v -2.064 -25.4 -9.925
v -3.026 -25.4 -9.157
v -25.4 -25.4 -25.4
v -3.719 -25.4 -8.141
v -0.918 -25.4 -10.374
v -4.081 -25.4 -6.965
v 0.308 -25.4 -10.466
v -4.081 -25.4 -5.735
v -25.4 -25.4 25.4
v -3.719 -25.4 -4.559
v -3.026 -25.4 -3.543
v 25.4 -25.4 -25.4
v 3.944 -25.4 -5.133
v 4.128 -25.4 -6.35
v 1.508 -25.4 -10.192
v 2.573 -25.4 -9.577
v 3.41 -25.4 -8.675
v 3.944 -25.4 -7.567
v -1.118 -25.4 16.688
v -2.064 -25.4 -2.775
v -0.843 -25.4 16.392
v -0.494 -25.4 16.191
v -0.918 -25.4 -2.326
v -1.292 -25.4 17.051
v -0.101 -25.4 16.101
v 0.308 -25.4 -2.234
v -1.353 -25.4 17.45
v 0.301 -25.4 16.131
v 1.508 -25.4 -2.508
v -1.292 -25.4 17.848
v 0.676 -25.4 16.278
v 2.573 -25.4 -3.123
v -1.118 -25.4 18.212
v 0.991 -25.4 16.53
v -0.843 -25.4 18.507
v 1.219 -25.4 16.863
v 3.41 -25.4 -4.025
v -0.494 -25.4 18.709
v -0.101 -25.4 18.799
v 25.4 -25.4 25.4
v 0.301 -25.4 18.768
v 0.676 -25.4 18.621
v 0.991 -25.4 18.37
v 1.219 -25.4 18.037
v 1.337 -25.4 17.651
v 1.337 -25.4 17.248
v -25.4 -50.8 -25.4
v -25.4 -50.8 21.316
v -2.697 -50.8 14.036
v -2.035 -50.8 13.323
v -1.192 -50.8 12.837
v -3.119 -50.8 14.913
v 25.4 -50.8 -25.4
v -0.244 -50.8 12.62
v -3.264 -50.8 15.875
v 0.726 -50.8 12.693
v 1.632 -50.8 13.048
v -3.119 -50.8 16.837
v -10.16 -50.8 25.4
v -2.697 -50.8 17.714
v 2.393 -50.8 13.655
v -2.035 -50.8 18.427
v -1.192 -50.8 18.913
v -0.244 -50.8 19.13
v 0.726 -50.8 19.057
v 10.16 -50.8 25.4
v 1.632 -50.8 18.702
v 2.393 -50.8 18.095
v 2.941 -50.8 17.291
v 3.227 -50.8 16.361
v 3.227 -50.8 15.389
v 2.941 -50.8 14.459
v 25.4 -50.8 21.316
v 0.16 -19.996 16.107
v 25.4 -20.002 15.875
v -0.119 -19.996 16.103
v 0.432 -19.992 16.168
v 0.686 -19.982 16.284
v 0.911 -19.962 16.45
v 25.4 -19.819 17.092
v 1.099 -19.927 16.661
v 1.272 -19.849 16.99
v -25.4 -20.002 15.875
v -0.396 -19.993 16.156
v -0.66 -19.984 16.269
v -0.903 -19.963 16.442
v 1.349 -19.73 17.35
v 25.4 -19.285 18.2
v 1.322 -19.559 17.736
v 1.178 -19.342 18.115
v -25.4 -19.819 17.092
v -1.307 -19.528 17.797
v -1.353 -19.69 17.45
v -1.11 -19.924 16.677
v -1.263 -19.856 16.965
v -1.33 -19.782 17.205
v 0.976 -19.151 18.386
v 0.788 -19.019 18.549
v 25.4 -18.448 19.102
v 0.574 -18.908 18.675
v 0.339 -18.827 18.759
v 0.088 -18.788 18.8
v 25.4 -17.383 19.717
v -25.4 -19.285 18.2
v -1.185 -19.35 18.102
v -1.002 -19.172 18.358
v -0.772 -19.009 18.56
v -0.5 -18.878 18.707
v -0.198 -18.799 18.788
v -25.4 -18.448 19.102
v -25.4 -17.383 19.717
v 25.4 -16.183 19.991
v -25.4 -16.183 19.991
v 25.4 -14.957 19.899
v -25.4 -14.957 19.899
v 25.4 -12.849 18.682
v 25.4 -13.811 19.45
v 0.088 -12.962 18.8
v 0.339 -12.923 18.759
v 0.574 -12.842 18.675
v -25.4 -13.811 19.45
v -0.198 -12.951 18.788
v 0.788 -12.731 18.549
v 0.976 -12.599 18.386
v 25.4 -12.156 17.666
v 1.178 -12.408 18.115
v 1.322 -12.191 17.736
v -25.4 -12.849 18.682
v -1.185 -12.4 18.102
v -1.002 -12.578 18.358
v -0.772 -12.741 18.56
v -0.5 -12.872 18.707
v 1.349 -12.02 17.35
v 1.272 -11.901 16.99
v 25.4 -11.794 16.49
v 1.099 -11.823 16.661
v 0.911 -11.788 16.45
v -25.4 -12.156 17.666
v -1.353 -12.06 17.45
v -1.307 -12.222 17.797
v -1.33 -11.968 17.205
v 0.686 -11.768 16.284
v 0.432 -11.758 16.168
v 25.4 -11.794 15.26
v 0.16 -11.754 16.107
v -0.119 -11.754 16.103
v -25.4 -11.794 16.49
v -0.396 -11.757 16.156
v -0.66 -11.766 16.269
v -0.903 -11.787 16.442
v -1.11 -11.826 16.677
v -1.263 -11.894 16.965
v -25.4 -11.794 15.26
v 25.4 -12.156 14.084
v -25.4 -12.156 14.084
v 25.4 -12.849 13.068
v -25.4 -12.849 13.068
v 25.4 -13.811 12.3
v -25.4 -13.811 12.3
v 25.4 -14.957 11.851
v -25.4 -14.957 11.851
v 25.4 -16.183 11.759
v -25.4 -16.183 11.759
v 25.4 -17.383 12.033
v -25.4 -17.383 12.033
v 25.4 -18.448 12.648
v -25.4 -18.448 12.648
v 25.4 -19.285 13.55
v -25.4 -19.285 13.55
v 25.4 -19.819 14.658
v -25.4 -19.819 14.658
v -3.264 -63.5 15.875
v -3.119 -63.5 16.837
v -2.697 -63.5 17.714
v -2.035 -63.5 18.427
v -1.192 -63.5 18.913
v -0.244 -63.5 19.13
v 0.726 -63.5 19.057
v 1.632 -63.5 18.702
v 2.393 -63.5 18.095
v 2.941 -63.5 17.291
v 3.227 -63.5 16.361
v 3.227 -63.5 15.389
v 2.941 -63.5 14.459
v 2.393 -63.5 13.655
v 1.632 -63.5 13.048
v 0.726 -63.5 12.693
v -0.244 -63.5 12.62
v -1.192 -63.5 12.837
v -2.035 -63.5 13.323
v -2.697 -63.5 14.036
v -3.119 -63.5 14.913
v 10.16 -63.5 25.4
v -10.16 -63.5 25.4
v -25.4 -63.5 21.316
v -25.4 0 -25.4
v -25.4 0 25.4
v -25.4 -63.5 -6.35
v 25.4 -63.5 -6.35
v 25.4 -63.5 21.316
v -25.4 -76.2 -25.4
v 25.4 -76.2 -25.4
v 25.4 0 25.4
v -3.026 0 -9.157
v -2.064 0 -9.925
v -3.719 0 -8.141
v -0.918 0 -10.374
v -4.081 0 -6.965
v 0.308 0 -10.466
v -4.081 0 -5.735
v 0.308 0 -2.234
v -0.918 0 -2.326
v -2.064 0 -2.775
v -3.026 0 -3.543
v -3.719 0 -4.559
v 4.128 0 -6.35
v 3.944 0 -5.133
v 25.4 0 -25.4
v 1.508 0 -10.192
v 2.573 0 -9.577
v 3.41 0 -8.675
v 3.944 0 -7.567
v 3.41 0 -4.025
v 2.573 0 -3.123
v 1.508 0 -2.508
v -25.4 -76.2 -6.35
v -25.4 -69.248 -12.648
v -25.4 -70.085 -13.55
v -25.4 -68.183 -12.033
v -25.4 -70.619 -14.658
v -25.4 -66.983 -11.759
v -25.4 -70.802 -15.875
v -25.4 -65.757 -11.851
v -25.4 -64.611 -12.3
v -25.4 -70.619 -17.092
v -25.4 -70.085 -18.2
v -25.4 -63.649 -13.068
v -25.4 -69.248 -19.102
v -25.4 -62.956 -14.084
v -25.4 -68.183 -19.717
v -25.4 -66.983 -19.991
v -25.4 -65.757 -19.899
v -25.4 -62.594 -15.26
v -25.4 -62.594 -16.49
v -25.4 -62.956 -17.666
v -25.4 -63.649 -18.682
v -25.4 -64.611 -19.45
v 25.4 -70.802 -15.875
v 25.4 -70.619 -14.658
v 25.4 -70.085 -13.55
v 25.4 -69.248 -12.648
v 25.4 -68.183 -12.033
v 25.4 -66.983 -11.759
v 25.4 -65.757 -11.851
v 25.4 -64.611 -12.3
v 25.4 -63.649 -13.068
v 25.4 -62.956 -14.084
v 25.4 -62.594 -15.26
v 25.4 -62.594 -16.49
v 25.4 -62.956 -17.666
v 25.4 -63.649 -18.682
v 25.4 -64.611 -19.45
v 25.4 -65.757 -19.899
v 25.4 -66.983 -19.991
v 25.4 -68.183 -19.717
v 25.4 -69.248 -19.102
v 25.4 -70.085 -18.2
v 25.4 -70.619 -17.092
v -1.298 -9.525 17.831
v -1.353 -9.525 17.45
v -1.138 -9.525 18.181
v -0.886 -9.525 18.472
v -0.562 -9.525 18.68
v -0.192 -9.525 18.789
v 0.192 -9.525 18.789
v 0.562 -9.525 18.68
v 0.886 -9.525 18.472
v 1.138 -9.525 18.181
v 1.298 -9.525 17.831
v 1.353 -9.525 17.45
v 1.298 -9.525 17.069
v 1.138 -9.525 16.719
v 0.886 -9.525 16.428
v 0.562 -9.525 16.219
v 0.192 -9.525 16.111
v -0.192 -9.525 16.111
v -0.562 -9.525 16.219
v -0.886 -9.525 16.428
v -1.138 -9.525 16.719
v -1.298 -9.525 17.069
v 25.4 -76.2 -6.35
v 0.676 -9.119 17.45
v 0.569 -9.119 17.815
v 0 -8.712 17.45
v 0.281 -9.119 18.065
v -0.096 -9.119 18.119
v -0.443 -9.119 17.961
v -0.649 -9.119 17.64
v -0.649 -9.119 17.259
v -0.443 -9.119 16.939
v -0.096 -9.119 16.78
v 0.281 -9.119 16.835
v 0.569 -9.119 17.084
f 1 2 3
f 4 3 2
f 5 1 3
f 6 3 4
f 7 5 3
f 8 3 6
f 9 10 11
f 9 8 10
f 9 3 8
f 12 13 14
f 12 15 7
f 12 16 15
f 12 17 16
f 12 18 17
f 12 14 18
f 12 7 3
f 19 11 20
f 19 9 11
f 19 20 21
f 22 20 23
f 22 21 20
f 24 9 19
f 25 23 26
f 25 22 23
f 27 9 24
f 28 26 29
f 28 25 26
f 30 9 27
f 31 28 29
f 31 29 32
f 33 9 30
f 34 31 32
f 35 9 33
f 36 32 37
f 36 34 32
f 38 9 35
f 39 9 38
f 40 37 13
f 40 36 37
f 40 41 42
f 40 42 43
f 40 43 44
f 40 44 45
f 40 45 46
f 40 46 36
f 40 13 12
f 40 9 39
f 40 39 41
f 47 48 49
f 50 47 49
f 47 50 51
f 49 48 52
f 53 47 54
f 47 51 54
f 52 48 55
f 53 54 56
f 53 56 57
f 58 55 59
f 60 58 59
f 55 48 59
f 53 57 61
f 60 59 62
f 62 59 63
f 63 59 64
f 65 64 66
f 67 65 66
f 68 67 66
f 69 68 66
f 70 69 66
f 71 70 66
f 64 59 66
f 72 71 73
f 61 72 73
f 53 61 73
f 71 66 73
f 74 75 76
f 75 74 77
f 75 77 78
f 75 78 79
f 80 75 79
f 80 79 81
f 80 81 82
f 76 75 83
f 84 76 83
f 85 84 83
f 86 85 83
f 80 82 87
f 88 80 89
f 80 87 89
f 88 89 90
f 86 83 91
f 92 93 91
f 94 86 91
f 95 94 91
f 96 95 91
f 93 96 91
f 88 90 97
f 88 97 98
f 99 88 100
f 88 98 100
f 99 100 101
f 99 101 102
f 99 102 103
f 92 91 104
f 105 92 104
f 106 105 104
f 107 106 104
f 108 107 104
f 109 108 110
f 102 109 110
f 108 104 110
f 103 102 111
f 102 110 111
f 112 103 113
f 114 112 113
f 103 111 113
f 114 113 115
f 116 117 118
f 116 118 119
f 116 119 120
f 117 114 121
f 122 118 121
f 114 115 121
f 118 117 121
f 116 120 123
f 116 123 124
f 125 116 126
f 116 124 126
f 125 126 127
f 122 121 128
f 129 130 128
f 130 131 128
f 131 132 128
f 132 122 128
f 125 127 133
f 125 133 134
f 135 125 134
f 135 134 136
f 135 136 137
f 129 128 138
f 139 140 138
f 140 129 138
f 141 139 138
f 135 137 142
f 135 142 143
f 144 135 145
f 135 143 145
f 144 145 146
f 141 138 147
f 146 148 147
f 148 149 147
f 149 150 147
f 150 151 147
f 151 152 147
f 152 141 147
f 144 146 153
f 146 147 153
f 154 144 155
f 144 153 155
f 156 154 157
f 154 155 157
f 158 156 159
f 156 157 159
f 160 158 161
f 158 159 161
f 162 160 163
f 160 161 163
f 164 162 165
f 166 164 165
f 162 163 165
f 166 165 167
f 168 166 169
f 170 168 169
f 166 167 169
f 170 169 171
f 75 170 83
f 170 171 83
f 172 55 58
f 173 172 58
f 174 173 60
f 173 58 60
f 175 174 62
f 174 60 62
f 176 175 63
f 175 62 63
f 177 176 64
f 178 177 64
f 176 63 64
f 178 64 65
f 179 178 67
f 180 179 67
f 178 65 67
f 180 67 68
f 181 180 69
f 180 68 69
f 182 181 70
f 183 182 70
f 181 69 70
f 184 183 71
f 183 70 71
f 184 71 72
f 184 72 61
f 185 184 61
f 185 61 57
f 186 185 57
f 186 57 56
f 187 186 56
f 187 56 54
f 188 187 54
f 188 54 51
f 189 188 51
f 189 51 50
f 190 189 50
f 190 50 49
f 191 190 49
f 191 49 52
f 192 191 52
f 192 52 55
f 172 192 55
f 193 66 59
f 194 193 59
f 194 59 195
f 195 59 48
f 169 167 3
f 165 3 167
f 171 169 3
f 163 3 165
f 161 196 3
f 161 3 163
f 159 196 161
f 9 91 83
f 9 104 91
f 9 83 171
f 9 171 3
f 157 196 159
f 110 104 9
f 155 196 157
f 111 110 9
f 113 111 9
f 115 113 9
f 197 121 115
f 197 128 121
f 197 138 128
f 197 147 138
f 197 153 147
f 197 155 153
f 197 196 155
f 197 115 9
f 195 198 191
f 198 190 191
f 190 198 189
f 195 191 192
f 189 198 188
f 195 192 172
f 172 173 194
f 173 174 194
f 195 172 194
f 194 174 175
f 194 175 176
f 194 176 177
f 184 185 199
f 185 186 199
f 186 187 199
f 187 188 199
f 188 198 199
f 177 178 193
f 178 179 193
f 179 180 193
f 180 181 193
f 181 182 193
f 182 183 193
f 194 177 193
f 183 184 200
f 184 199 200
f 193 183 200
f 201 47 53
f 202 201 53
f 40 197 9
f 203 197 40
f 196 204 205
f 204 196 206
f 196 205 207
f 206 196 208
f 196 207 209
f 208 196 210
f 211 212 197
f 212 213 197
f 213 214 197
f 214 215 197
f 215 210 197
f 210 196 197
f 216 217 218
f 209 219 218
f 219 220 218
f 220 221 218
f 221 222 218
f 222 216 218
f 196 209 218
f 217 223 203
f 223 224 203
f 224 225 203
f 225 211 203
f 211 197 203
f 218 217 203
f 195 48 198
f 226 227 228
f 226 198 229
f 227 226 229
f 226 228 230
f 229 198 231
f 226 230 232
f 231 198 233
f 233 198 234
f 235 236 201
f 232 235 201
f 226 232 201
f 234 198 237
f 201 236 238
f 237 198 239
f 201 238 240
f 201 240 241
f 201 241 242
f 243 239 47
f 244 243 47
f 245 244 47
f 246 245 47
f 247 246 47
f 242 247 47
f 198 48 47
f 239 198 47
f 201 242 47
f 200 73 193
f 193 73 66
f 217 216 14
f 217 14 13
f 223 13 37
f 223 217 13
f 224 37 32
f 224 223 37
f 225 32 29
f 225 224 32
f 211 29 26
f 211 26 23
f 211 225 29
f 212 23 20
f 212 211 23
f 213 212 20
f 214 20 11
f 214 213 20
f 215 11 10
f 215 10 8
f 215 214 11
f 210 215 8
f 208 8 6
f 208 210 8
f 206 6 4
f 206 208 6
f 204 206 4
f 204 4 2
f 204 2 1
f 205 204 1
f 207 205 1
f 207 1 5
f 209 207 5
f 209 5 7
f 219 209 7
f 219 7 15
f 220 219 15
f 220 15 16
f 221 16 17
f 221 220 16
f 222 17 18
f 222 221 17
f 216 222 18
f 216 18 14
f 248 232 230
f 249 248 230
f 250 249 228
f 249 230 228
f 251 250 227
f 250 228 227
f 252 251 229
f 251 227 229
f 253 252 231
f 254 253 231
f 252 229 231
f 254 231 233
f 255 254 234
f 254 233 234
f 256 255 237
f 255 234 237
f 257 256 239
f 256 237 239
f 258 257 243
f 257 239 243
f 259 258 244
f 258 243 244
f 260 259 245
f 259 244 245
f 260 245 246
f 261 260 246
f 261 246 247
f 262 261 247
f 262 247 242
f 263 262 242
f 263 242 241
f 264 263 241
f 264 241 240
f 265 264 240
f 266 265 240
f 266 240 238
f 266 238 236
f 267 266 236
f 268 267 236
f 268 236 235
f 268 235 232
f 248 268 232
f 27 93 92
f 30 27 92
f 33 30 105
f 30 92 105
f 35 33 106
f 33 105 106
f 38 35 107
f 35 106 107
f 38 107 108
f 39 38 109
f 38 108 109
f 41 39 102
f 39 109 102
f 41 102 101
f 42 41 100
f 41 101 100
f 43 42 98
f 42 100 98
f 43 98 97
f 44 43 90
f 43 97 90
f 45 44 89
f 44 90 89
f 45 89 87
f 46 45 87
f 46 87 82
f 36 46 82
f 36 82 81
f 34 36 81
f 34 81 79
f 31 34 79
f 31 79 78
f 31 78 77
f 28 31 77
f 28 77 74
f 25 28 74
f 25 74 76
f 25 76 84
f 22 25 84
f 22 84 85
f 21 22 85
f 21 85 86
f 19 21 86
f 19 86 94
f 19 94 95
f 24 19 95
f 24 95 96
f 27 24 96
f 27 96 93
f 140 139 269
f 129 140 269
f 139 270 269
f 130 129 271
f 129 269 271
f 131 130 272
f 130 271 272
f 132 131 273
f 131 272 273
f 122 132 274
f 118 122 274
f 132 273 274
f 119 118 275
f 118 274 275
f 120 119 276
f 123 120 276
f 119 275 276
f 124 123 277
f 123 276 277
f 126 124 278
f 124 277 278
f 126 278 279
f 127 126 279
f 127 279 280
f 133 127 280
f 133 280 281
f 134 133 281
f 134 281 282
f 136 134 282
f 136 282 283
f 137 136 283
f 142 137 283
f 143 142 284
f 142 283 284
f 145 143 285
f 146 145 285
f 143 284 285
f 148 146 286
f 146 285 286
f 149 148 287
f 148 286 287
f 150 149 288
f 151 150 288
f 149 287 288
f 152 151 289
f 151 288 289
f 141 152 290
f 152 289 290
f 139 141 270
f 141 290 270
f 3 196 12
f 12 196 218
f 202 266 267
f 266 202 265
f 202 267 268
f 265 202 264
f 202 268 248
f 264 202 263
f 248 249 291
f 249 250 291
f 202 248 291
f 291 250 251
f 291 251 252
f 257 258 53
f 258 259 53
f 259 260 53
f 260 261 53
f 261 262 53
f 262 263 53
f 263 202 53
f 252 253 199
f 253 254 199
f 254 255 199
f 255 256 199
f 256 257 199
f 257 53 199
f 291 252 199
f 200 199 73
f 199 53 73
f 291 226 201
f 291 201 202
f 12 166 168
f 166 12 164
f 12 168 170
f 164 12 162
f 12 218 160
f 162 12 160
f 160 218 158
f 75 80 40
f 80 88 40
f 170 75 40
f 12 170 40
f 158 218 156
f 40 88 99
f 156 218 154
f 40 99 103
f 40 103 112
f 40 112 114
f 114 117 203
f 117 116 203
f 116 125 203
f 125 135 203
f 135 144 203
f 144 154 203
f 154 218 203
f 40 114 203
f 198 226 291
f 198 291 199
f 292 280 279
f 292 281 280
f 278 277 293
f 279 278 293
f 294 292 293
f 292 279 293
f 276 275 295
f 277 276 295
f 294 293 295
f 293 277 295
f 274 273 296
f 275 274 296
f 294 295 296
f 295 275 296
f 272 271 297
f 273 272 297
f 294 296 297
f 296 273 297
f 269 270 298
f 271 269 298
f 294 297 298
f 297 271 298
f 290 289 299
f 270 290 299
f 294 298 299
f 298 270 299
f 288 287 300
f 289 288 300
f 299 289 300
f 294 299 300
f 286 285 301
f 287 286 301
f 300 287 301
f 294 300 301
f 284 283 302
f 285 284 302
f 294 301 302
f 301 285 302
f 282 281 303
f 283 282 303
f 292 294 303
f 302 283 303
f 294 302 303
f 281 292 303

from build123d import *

# Parameters (mm, degrees)
F0_W      = 50.8
F0_H      = 50.8
F0_R      = 4.1275
F1_DEPTH  = 25.4
F3_D      = 8.255
F6_DEPTH  = 25.4
F8_D      = 6.5278
F9_W      = 12.7
F9_H      = 27.6664543073
F9_H_2    = 4.0835456927
F10_DEPTH = 50.801
F12_D     = 8.255
F14_D     = 2.7051
F14_DEPTH = 15.875
F14_TIP   = 0.8126940303


with BuildPart() as f1:
    # F0 (on Front) → F1 (new body)
    with BuildSketch(Plane.XZ):
        Rectangle(F0_W, F0_H)
        with Locations((0, -6.35)):
            Circle(F0_R, mode=Mode.SUBTRACT)
    extrude(amount=F1_DEPTH)

    # F3 (through all)
    with Locations(Plane.YZ.offset(25.4)):
        with Locations((-15.875, 15.875)):
            Hole(F3_D / 2)

    # F14
    with Locations(Plane.XZ.offset(25.4)):
        with Locations((0, 17.4498)):
            Hole(F14_D / 2, depth=F14_DEPTH)
            with Locations((0, 0, -(F14_DEPTH + F14_TIP / 2))):  # 118° drill point
                Cone(0, F14_D / 2, F14_TIP, mode=Mode.SUBTRACT)


with BuildPart() as f6:
    # F5 (on offset) → F6 (new body)
    with BuildSketch(Plane.XZ.offset(50.8)):
        Polygon((25.4, 21.3164543073), (10.16, 25.4), (-10.16, 25.4), (-25.4, 21.3164543073), (-25.4, -25.4), (25.4, -25.4), align=None)
    extrude(amount=F6_DEPTH)

    # F8 (through all)
    with Locations(Plane.XZ.offset(76.2)):
        with Locations((0, 15.875)):
            Hole(F8_D / 2)

    # F9 (on face) → F10 (cut, through all)
    with BuildSketch(Plane.YZ.offset(25.4)):
        with Locations((-69.85, 7.4832271537)):
            Rectangle(F9_W, F9_H)
        with Locations((-69.85, 23.3582271537)):
            Rectangle(F9_W, F9_H_2)
    extrude(amount=-F10_DEPTH, mode=Mode.SUBTRACT)

    # F12 (through all)
    with Locations(Plane.YZ.offset(25.4)):
        with Locations((-66.675, -15.875)):
            Hole(F12_D / 2)


solid = Compound([f1.part, f6.part])
